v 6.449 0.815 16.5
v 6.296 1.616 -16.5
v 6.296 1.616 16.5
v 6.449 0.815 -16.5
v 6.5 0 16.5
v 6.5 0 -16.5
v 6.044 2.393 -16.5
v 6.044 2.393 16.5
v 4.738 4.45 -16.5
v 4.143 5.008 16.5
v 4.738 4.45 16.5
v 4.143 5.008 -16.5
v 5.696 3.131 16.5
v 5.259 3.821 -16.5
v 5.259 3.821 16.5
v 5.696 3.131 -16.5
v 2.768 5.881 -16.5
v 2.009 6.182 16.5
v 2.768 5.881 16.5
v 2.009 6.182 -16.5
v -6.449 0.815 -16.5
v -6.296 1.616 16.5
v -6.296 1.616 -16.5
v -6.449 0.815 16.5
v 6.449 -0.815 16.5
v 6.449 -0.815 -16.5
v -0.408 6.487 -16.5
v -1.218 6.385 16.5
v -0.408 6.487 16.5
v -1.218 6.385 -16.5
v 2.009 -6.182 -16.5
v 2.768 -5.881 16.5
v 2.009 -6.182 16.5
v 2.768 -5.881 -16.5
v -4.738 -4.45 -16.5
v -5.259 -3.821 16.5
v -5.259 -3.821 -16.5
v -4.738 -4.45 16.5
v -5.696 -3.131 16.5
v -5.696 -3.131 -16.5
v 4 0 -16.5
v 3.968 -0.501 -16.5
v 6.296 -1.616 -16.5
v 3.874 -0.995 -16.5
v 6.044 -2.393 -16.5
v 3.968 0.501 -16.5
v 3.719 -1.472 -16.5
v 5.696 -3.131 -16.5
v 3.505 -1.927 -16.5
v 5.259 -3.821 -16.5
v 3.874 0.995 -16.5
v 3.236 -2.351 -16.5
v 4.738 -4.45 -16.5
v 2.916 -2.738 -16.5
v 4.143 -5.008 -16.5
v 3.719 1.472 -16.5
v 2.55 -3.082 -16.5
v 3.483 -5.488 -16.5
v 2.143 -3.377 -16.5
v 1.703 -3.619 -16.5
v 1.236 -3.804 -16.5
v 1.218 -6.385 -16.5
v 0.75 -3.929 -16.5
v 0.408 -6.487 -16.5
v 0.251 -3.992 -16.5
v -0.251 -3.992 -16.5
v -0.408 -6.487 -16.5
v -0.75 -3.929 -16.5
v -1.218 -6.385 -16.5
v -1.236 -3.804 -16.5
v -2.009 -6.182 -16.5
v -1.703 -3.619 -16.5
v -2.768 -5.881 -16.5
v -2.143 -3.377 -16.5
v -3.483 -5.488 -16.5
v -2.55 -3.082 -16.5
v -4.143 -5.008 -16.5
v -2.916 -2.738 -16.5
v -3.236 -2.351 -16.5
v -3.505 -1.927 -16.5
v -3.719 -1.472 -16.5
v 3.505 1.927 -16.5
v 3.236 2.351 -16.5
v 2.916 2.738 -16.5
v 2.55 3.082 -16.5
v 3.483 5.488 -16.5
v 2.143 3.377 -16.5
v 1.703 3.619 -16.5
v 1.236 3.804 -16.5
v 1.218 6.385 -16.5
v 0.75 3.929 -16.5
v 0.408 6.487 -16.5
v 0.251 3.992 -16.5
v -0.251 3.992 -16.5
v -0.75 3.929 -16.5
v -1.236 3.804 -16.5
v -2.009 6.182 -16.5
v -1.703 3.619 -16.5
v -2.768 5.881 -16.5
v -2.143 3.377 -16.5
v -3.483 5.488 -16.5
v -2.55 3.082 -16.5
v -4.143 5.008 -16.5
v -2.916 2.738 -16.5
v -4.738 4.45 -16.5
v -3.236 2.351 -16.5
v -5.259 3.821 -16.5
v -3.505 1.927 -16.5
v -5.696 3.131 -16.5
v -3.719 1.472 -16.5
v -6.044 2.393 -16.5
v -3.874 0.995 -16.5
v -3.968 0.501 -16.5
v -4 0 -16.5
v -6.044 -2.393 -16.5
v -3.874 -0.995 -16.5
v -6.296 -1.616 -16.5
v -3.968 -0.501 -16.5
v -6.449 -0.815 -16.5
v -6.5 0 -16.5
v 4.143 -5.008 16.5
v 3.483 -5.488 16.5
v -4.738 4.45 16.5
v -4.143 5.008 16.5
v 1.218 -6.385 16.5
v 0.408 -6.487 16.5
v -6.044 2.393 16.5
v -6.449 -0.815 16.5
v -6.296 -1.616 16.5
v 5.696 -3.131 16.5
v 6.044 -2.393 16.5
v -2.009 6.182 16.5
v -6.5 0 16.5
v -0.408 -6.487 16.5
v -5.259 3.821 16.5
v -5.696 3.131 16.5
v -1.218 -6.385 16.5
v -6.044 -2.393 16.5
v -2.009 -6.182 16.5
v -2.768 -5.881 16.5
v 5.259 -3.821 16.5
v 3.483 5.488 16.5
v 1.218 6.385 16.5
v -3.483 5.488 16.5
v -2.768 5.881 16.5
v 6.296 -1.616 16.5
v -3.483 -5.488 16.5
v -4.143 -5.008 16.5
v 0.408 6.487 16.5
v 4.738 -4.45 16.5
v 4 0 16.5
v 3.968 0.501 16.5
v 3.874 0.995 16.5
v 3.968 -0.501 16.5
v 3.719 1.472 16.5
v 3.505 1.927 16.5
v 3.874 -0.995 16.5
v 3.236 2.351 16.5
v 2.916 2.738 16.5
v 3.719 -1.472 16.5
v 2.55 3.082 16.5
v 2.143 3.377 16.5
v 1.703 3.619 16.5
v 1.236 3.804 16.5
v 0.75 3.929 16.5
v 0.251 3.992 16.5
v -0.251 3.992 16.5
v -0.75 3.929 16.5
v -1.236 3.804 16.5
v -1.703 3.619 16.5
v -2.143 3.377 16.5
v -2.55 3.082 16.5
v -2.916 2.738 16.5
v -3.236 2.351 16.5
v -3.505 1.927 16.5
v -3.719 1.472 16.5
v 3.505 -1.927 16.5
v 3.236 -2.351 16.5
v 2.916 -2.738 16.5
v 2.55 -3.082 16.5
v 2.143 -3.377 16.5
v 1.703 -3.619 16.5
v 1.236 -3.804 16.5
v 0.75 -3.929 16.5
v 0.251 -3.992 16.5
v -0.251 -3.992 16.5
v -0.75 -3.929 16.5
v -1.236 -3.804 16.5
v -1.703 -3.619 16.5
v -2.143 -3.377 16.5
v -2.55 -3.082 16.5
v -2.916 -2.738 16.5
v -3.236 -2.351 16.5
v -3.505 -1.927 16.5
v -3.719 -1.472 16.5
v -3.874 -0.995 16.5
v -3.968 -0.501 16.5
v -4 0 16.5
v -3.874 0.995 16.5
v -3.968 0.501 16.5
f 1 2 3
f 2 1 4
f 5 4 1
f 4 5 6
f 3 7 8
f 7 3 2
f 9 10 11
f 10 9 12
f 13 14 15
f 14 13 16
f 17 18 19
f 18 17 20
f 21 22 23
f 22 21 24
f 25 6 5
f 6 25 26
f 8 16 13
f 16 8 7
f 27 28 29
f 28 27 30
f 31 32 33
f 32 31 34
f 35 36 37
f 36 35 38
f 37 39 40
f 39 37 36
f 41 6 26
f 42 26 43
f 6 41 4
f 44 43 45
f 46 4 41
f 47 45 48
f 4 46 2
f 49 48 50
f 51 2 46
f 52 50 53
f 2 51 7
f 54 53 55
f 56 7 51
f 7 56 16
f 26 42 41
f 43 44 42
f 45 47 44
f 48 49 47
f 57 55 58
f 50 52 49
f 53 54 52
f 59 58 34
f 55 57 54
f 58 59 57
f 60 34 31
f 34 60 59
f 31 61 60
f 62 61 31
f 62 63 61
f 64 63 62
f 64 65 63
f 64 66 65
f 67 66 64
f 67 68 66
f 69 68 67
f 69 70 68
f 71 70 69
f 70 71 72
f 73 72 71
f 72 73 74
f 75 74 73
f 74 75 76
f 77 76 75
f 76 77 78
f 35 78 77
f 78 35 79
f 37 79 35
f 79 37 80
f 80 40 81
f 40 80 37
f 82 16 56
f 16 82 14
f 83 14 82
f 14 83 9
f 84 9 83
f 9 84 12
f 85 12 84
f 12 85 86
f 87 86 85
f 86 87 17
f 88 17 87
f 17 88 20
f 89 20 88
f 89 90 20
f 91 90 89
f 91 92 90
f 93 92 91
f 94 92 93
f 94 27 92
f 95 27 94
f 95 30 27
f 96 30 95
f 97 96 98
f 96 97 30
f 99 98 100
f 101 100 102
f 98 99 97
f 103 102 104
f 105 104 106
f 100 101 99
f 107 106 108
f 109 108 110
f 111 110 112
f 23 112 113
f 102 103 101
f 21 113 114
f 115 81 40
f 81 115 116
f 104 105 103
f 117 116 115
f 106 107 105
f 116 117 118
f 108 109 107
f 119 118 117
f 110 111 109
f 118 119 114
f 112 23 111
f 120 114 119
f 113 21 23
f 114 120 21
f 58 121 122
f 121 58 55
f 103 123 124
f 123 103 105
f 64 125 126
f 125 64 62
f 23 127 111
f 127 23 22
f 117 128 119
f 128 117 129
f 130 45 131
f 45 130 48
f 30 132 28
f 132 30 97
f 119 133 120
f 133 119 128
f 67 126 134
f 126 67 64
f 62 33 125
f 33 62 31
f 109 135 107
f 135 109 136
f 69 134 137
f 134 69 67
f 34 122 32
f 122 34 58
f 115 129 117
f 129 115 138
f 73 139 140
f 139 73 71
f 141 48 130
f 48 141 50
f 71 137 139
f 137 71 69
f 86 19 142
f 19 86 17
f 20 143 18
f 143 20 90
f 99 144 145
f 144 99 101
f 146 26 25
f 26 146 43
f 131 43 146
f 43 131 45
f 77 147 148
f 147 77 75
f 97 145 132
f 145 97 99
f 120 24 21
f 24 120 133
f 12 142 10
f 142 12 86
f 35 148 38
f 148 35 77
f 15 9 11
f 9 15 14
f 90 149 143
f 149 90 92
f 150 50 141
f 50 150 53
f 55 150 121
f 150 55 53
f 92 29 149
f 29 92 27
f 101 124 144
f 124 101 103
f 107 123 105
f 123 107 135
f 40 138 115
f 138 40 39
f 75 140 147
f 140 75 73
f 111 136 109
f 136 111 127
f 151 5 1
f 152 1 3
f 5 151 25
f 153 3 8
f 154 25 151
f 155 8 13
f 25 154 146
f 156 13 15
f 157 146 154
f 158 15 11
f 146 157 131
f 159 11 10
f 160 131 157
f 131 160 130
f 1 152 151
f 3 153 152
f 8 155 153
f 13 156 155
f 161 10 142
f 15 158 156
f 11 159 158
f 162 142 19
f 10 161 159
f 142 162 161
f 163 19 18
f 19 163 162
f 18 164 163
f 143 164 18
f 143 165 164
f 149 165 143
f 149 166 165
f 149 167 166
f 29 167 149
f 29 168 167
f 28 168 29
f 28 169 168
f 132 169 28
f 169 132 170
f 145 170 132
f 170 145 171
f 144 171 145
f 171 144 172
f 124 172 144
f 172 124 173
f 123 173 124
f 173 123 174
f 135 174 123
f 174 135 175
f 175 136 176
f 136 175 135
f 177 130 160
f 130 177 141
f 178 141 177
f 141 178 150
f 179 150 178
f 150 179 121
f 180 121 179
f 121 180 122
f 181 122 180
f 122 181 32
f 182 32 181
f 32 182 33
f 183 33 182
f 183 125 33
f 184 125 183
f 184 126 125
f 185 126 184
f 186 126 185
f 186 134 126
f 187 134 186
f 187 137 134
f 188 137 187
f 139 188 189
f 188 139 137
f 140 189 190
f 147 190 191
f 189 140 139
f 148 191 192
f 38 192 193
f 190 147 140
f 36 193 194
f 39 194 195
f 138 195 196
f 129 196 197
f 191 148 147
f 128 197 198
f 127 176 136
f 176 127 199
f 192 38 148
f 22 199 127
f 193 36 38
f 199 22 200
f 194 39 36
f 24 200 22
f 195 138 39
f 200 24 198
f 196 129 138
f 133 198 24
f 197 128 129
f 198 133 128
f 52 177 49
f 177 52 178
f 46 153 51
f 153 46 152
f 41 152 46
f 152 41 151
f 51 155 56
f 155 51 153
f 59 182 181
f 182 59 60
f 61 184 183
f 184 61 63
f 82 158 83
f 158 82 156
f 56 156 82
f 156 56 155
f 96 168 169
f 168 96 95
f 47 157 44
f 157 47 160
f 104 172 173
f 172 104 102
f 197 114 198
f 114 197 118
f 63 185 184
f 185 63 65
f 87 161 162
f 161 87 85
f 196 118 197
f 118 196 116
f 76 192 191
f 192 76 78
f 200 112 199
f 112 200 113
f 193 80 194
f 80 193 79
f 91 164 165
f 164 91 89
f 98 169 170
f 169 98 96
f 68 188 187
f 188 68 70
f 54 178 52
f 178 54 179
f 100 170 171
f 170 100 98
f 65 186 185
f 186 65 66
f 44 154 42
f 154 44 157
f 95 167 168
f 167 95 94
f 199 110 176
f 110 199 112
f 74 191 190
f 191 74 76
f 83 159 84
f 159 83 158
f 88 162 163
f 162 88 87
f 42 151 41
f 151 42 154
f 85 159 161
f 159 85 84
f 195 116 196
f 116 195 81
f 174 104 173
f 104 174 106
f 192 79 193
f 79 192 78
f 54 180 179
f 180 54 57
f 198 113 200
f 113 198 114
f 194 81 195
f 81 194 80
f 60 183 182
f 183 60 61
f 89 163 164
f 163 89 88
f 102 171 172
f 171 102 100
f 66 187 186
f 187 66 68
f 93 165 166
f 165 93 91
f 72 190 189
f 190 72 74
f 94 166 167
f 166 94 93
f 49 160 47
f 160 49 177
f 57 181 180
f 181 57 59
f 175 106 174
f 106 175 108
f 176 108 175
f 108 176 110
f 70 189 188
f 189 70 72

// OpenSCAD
$fn = 50;


difference() {
	union() {
		translate(v = [0, 0, -16.5000000000]) {
			cylinder(h = 33, r = 6.5000000000);
		}
	}
	union() {
		translate(v = [0, 0, -100.0000000000]) {
			cylinder(h = 200, r = 4.0000000000);
		}
	}
}
